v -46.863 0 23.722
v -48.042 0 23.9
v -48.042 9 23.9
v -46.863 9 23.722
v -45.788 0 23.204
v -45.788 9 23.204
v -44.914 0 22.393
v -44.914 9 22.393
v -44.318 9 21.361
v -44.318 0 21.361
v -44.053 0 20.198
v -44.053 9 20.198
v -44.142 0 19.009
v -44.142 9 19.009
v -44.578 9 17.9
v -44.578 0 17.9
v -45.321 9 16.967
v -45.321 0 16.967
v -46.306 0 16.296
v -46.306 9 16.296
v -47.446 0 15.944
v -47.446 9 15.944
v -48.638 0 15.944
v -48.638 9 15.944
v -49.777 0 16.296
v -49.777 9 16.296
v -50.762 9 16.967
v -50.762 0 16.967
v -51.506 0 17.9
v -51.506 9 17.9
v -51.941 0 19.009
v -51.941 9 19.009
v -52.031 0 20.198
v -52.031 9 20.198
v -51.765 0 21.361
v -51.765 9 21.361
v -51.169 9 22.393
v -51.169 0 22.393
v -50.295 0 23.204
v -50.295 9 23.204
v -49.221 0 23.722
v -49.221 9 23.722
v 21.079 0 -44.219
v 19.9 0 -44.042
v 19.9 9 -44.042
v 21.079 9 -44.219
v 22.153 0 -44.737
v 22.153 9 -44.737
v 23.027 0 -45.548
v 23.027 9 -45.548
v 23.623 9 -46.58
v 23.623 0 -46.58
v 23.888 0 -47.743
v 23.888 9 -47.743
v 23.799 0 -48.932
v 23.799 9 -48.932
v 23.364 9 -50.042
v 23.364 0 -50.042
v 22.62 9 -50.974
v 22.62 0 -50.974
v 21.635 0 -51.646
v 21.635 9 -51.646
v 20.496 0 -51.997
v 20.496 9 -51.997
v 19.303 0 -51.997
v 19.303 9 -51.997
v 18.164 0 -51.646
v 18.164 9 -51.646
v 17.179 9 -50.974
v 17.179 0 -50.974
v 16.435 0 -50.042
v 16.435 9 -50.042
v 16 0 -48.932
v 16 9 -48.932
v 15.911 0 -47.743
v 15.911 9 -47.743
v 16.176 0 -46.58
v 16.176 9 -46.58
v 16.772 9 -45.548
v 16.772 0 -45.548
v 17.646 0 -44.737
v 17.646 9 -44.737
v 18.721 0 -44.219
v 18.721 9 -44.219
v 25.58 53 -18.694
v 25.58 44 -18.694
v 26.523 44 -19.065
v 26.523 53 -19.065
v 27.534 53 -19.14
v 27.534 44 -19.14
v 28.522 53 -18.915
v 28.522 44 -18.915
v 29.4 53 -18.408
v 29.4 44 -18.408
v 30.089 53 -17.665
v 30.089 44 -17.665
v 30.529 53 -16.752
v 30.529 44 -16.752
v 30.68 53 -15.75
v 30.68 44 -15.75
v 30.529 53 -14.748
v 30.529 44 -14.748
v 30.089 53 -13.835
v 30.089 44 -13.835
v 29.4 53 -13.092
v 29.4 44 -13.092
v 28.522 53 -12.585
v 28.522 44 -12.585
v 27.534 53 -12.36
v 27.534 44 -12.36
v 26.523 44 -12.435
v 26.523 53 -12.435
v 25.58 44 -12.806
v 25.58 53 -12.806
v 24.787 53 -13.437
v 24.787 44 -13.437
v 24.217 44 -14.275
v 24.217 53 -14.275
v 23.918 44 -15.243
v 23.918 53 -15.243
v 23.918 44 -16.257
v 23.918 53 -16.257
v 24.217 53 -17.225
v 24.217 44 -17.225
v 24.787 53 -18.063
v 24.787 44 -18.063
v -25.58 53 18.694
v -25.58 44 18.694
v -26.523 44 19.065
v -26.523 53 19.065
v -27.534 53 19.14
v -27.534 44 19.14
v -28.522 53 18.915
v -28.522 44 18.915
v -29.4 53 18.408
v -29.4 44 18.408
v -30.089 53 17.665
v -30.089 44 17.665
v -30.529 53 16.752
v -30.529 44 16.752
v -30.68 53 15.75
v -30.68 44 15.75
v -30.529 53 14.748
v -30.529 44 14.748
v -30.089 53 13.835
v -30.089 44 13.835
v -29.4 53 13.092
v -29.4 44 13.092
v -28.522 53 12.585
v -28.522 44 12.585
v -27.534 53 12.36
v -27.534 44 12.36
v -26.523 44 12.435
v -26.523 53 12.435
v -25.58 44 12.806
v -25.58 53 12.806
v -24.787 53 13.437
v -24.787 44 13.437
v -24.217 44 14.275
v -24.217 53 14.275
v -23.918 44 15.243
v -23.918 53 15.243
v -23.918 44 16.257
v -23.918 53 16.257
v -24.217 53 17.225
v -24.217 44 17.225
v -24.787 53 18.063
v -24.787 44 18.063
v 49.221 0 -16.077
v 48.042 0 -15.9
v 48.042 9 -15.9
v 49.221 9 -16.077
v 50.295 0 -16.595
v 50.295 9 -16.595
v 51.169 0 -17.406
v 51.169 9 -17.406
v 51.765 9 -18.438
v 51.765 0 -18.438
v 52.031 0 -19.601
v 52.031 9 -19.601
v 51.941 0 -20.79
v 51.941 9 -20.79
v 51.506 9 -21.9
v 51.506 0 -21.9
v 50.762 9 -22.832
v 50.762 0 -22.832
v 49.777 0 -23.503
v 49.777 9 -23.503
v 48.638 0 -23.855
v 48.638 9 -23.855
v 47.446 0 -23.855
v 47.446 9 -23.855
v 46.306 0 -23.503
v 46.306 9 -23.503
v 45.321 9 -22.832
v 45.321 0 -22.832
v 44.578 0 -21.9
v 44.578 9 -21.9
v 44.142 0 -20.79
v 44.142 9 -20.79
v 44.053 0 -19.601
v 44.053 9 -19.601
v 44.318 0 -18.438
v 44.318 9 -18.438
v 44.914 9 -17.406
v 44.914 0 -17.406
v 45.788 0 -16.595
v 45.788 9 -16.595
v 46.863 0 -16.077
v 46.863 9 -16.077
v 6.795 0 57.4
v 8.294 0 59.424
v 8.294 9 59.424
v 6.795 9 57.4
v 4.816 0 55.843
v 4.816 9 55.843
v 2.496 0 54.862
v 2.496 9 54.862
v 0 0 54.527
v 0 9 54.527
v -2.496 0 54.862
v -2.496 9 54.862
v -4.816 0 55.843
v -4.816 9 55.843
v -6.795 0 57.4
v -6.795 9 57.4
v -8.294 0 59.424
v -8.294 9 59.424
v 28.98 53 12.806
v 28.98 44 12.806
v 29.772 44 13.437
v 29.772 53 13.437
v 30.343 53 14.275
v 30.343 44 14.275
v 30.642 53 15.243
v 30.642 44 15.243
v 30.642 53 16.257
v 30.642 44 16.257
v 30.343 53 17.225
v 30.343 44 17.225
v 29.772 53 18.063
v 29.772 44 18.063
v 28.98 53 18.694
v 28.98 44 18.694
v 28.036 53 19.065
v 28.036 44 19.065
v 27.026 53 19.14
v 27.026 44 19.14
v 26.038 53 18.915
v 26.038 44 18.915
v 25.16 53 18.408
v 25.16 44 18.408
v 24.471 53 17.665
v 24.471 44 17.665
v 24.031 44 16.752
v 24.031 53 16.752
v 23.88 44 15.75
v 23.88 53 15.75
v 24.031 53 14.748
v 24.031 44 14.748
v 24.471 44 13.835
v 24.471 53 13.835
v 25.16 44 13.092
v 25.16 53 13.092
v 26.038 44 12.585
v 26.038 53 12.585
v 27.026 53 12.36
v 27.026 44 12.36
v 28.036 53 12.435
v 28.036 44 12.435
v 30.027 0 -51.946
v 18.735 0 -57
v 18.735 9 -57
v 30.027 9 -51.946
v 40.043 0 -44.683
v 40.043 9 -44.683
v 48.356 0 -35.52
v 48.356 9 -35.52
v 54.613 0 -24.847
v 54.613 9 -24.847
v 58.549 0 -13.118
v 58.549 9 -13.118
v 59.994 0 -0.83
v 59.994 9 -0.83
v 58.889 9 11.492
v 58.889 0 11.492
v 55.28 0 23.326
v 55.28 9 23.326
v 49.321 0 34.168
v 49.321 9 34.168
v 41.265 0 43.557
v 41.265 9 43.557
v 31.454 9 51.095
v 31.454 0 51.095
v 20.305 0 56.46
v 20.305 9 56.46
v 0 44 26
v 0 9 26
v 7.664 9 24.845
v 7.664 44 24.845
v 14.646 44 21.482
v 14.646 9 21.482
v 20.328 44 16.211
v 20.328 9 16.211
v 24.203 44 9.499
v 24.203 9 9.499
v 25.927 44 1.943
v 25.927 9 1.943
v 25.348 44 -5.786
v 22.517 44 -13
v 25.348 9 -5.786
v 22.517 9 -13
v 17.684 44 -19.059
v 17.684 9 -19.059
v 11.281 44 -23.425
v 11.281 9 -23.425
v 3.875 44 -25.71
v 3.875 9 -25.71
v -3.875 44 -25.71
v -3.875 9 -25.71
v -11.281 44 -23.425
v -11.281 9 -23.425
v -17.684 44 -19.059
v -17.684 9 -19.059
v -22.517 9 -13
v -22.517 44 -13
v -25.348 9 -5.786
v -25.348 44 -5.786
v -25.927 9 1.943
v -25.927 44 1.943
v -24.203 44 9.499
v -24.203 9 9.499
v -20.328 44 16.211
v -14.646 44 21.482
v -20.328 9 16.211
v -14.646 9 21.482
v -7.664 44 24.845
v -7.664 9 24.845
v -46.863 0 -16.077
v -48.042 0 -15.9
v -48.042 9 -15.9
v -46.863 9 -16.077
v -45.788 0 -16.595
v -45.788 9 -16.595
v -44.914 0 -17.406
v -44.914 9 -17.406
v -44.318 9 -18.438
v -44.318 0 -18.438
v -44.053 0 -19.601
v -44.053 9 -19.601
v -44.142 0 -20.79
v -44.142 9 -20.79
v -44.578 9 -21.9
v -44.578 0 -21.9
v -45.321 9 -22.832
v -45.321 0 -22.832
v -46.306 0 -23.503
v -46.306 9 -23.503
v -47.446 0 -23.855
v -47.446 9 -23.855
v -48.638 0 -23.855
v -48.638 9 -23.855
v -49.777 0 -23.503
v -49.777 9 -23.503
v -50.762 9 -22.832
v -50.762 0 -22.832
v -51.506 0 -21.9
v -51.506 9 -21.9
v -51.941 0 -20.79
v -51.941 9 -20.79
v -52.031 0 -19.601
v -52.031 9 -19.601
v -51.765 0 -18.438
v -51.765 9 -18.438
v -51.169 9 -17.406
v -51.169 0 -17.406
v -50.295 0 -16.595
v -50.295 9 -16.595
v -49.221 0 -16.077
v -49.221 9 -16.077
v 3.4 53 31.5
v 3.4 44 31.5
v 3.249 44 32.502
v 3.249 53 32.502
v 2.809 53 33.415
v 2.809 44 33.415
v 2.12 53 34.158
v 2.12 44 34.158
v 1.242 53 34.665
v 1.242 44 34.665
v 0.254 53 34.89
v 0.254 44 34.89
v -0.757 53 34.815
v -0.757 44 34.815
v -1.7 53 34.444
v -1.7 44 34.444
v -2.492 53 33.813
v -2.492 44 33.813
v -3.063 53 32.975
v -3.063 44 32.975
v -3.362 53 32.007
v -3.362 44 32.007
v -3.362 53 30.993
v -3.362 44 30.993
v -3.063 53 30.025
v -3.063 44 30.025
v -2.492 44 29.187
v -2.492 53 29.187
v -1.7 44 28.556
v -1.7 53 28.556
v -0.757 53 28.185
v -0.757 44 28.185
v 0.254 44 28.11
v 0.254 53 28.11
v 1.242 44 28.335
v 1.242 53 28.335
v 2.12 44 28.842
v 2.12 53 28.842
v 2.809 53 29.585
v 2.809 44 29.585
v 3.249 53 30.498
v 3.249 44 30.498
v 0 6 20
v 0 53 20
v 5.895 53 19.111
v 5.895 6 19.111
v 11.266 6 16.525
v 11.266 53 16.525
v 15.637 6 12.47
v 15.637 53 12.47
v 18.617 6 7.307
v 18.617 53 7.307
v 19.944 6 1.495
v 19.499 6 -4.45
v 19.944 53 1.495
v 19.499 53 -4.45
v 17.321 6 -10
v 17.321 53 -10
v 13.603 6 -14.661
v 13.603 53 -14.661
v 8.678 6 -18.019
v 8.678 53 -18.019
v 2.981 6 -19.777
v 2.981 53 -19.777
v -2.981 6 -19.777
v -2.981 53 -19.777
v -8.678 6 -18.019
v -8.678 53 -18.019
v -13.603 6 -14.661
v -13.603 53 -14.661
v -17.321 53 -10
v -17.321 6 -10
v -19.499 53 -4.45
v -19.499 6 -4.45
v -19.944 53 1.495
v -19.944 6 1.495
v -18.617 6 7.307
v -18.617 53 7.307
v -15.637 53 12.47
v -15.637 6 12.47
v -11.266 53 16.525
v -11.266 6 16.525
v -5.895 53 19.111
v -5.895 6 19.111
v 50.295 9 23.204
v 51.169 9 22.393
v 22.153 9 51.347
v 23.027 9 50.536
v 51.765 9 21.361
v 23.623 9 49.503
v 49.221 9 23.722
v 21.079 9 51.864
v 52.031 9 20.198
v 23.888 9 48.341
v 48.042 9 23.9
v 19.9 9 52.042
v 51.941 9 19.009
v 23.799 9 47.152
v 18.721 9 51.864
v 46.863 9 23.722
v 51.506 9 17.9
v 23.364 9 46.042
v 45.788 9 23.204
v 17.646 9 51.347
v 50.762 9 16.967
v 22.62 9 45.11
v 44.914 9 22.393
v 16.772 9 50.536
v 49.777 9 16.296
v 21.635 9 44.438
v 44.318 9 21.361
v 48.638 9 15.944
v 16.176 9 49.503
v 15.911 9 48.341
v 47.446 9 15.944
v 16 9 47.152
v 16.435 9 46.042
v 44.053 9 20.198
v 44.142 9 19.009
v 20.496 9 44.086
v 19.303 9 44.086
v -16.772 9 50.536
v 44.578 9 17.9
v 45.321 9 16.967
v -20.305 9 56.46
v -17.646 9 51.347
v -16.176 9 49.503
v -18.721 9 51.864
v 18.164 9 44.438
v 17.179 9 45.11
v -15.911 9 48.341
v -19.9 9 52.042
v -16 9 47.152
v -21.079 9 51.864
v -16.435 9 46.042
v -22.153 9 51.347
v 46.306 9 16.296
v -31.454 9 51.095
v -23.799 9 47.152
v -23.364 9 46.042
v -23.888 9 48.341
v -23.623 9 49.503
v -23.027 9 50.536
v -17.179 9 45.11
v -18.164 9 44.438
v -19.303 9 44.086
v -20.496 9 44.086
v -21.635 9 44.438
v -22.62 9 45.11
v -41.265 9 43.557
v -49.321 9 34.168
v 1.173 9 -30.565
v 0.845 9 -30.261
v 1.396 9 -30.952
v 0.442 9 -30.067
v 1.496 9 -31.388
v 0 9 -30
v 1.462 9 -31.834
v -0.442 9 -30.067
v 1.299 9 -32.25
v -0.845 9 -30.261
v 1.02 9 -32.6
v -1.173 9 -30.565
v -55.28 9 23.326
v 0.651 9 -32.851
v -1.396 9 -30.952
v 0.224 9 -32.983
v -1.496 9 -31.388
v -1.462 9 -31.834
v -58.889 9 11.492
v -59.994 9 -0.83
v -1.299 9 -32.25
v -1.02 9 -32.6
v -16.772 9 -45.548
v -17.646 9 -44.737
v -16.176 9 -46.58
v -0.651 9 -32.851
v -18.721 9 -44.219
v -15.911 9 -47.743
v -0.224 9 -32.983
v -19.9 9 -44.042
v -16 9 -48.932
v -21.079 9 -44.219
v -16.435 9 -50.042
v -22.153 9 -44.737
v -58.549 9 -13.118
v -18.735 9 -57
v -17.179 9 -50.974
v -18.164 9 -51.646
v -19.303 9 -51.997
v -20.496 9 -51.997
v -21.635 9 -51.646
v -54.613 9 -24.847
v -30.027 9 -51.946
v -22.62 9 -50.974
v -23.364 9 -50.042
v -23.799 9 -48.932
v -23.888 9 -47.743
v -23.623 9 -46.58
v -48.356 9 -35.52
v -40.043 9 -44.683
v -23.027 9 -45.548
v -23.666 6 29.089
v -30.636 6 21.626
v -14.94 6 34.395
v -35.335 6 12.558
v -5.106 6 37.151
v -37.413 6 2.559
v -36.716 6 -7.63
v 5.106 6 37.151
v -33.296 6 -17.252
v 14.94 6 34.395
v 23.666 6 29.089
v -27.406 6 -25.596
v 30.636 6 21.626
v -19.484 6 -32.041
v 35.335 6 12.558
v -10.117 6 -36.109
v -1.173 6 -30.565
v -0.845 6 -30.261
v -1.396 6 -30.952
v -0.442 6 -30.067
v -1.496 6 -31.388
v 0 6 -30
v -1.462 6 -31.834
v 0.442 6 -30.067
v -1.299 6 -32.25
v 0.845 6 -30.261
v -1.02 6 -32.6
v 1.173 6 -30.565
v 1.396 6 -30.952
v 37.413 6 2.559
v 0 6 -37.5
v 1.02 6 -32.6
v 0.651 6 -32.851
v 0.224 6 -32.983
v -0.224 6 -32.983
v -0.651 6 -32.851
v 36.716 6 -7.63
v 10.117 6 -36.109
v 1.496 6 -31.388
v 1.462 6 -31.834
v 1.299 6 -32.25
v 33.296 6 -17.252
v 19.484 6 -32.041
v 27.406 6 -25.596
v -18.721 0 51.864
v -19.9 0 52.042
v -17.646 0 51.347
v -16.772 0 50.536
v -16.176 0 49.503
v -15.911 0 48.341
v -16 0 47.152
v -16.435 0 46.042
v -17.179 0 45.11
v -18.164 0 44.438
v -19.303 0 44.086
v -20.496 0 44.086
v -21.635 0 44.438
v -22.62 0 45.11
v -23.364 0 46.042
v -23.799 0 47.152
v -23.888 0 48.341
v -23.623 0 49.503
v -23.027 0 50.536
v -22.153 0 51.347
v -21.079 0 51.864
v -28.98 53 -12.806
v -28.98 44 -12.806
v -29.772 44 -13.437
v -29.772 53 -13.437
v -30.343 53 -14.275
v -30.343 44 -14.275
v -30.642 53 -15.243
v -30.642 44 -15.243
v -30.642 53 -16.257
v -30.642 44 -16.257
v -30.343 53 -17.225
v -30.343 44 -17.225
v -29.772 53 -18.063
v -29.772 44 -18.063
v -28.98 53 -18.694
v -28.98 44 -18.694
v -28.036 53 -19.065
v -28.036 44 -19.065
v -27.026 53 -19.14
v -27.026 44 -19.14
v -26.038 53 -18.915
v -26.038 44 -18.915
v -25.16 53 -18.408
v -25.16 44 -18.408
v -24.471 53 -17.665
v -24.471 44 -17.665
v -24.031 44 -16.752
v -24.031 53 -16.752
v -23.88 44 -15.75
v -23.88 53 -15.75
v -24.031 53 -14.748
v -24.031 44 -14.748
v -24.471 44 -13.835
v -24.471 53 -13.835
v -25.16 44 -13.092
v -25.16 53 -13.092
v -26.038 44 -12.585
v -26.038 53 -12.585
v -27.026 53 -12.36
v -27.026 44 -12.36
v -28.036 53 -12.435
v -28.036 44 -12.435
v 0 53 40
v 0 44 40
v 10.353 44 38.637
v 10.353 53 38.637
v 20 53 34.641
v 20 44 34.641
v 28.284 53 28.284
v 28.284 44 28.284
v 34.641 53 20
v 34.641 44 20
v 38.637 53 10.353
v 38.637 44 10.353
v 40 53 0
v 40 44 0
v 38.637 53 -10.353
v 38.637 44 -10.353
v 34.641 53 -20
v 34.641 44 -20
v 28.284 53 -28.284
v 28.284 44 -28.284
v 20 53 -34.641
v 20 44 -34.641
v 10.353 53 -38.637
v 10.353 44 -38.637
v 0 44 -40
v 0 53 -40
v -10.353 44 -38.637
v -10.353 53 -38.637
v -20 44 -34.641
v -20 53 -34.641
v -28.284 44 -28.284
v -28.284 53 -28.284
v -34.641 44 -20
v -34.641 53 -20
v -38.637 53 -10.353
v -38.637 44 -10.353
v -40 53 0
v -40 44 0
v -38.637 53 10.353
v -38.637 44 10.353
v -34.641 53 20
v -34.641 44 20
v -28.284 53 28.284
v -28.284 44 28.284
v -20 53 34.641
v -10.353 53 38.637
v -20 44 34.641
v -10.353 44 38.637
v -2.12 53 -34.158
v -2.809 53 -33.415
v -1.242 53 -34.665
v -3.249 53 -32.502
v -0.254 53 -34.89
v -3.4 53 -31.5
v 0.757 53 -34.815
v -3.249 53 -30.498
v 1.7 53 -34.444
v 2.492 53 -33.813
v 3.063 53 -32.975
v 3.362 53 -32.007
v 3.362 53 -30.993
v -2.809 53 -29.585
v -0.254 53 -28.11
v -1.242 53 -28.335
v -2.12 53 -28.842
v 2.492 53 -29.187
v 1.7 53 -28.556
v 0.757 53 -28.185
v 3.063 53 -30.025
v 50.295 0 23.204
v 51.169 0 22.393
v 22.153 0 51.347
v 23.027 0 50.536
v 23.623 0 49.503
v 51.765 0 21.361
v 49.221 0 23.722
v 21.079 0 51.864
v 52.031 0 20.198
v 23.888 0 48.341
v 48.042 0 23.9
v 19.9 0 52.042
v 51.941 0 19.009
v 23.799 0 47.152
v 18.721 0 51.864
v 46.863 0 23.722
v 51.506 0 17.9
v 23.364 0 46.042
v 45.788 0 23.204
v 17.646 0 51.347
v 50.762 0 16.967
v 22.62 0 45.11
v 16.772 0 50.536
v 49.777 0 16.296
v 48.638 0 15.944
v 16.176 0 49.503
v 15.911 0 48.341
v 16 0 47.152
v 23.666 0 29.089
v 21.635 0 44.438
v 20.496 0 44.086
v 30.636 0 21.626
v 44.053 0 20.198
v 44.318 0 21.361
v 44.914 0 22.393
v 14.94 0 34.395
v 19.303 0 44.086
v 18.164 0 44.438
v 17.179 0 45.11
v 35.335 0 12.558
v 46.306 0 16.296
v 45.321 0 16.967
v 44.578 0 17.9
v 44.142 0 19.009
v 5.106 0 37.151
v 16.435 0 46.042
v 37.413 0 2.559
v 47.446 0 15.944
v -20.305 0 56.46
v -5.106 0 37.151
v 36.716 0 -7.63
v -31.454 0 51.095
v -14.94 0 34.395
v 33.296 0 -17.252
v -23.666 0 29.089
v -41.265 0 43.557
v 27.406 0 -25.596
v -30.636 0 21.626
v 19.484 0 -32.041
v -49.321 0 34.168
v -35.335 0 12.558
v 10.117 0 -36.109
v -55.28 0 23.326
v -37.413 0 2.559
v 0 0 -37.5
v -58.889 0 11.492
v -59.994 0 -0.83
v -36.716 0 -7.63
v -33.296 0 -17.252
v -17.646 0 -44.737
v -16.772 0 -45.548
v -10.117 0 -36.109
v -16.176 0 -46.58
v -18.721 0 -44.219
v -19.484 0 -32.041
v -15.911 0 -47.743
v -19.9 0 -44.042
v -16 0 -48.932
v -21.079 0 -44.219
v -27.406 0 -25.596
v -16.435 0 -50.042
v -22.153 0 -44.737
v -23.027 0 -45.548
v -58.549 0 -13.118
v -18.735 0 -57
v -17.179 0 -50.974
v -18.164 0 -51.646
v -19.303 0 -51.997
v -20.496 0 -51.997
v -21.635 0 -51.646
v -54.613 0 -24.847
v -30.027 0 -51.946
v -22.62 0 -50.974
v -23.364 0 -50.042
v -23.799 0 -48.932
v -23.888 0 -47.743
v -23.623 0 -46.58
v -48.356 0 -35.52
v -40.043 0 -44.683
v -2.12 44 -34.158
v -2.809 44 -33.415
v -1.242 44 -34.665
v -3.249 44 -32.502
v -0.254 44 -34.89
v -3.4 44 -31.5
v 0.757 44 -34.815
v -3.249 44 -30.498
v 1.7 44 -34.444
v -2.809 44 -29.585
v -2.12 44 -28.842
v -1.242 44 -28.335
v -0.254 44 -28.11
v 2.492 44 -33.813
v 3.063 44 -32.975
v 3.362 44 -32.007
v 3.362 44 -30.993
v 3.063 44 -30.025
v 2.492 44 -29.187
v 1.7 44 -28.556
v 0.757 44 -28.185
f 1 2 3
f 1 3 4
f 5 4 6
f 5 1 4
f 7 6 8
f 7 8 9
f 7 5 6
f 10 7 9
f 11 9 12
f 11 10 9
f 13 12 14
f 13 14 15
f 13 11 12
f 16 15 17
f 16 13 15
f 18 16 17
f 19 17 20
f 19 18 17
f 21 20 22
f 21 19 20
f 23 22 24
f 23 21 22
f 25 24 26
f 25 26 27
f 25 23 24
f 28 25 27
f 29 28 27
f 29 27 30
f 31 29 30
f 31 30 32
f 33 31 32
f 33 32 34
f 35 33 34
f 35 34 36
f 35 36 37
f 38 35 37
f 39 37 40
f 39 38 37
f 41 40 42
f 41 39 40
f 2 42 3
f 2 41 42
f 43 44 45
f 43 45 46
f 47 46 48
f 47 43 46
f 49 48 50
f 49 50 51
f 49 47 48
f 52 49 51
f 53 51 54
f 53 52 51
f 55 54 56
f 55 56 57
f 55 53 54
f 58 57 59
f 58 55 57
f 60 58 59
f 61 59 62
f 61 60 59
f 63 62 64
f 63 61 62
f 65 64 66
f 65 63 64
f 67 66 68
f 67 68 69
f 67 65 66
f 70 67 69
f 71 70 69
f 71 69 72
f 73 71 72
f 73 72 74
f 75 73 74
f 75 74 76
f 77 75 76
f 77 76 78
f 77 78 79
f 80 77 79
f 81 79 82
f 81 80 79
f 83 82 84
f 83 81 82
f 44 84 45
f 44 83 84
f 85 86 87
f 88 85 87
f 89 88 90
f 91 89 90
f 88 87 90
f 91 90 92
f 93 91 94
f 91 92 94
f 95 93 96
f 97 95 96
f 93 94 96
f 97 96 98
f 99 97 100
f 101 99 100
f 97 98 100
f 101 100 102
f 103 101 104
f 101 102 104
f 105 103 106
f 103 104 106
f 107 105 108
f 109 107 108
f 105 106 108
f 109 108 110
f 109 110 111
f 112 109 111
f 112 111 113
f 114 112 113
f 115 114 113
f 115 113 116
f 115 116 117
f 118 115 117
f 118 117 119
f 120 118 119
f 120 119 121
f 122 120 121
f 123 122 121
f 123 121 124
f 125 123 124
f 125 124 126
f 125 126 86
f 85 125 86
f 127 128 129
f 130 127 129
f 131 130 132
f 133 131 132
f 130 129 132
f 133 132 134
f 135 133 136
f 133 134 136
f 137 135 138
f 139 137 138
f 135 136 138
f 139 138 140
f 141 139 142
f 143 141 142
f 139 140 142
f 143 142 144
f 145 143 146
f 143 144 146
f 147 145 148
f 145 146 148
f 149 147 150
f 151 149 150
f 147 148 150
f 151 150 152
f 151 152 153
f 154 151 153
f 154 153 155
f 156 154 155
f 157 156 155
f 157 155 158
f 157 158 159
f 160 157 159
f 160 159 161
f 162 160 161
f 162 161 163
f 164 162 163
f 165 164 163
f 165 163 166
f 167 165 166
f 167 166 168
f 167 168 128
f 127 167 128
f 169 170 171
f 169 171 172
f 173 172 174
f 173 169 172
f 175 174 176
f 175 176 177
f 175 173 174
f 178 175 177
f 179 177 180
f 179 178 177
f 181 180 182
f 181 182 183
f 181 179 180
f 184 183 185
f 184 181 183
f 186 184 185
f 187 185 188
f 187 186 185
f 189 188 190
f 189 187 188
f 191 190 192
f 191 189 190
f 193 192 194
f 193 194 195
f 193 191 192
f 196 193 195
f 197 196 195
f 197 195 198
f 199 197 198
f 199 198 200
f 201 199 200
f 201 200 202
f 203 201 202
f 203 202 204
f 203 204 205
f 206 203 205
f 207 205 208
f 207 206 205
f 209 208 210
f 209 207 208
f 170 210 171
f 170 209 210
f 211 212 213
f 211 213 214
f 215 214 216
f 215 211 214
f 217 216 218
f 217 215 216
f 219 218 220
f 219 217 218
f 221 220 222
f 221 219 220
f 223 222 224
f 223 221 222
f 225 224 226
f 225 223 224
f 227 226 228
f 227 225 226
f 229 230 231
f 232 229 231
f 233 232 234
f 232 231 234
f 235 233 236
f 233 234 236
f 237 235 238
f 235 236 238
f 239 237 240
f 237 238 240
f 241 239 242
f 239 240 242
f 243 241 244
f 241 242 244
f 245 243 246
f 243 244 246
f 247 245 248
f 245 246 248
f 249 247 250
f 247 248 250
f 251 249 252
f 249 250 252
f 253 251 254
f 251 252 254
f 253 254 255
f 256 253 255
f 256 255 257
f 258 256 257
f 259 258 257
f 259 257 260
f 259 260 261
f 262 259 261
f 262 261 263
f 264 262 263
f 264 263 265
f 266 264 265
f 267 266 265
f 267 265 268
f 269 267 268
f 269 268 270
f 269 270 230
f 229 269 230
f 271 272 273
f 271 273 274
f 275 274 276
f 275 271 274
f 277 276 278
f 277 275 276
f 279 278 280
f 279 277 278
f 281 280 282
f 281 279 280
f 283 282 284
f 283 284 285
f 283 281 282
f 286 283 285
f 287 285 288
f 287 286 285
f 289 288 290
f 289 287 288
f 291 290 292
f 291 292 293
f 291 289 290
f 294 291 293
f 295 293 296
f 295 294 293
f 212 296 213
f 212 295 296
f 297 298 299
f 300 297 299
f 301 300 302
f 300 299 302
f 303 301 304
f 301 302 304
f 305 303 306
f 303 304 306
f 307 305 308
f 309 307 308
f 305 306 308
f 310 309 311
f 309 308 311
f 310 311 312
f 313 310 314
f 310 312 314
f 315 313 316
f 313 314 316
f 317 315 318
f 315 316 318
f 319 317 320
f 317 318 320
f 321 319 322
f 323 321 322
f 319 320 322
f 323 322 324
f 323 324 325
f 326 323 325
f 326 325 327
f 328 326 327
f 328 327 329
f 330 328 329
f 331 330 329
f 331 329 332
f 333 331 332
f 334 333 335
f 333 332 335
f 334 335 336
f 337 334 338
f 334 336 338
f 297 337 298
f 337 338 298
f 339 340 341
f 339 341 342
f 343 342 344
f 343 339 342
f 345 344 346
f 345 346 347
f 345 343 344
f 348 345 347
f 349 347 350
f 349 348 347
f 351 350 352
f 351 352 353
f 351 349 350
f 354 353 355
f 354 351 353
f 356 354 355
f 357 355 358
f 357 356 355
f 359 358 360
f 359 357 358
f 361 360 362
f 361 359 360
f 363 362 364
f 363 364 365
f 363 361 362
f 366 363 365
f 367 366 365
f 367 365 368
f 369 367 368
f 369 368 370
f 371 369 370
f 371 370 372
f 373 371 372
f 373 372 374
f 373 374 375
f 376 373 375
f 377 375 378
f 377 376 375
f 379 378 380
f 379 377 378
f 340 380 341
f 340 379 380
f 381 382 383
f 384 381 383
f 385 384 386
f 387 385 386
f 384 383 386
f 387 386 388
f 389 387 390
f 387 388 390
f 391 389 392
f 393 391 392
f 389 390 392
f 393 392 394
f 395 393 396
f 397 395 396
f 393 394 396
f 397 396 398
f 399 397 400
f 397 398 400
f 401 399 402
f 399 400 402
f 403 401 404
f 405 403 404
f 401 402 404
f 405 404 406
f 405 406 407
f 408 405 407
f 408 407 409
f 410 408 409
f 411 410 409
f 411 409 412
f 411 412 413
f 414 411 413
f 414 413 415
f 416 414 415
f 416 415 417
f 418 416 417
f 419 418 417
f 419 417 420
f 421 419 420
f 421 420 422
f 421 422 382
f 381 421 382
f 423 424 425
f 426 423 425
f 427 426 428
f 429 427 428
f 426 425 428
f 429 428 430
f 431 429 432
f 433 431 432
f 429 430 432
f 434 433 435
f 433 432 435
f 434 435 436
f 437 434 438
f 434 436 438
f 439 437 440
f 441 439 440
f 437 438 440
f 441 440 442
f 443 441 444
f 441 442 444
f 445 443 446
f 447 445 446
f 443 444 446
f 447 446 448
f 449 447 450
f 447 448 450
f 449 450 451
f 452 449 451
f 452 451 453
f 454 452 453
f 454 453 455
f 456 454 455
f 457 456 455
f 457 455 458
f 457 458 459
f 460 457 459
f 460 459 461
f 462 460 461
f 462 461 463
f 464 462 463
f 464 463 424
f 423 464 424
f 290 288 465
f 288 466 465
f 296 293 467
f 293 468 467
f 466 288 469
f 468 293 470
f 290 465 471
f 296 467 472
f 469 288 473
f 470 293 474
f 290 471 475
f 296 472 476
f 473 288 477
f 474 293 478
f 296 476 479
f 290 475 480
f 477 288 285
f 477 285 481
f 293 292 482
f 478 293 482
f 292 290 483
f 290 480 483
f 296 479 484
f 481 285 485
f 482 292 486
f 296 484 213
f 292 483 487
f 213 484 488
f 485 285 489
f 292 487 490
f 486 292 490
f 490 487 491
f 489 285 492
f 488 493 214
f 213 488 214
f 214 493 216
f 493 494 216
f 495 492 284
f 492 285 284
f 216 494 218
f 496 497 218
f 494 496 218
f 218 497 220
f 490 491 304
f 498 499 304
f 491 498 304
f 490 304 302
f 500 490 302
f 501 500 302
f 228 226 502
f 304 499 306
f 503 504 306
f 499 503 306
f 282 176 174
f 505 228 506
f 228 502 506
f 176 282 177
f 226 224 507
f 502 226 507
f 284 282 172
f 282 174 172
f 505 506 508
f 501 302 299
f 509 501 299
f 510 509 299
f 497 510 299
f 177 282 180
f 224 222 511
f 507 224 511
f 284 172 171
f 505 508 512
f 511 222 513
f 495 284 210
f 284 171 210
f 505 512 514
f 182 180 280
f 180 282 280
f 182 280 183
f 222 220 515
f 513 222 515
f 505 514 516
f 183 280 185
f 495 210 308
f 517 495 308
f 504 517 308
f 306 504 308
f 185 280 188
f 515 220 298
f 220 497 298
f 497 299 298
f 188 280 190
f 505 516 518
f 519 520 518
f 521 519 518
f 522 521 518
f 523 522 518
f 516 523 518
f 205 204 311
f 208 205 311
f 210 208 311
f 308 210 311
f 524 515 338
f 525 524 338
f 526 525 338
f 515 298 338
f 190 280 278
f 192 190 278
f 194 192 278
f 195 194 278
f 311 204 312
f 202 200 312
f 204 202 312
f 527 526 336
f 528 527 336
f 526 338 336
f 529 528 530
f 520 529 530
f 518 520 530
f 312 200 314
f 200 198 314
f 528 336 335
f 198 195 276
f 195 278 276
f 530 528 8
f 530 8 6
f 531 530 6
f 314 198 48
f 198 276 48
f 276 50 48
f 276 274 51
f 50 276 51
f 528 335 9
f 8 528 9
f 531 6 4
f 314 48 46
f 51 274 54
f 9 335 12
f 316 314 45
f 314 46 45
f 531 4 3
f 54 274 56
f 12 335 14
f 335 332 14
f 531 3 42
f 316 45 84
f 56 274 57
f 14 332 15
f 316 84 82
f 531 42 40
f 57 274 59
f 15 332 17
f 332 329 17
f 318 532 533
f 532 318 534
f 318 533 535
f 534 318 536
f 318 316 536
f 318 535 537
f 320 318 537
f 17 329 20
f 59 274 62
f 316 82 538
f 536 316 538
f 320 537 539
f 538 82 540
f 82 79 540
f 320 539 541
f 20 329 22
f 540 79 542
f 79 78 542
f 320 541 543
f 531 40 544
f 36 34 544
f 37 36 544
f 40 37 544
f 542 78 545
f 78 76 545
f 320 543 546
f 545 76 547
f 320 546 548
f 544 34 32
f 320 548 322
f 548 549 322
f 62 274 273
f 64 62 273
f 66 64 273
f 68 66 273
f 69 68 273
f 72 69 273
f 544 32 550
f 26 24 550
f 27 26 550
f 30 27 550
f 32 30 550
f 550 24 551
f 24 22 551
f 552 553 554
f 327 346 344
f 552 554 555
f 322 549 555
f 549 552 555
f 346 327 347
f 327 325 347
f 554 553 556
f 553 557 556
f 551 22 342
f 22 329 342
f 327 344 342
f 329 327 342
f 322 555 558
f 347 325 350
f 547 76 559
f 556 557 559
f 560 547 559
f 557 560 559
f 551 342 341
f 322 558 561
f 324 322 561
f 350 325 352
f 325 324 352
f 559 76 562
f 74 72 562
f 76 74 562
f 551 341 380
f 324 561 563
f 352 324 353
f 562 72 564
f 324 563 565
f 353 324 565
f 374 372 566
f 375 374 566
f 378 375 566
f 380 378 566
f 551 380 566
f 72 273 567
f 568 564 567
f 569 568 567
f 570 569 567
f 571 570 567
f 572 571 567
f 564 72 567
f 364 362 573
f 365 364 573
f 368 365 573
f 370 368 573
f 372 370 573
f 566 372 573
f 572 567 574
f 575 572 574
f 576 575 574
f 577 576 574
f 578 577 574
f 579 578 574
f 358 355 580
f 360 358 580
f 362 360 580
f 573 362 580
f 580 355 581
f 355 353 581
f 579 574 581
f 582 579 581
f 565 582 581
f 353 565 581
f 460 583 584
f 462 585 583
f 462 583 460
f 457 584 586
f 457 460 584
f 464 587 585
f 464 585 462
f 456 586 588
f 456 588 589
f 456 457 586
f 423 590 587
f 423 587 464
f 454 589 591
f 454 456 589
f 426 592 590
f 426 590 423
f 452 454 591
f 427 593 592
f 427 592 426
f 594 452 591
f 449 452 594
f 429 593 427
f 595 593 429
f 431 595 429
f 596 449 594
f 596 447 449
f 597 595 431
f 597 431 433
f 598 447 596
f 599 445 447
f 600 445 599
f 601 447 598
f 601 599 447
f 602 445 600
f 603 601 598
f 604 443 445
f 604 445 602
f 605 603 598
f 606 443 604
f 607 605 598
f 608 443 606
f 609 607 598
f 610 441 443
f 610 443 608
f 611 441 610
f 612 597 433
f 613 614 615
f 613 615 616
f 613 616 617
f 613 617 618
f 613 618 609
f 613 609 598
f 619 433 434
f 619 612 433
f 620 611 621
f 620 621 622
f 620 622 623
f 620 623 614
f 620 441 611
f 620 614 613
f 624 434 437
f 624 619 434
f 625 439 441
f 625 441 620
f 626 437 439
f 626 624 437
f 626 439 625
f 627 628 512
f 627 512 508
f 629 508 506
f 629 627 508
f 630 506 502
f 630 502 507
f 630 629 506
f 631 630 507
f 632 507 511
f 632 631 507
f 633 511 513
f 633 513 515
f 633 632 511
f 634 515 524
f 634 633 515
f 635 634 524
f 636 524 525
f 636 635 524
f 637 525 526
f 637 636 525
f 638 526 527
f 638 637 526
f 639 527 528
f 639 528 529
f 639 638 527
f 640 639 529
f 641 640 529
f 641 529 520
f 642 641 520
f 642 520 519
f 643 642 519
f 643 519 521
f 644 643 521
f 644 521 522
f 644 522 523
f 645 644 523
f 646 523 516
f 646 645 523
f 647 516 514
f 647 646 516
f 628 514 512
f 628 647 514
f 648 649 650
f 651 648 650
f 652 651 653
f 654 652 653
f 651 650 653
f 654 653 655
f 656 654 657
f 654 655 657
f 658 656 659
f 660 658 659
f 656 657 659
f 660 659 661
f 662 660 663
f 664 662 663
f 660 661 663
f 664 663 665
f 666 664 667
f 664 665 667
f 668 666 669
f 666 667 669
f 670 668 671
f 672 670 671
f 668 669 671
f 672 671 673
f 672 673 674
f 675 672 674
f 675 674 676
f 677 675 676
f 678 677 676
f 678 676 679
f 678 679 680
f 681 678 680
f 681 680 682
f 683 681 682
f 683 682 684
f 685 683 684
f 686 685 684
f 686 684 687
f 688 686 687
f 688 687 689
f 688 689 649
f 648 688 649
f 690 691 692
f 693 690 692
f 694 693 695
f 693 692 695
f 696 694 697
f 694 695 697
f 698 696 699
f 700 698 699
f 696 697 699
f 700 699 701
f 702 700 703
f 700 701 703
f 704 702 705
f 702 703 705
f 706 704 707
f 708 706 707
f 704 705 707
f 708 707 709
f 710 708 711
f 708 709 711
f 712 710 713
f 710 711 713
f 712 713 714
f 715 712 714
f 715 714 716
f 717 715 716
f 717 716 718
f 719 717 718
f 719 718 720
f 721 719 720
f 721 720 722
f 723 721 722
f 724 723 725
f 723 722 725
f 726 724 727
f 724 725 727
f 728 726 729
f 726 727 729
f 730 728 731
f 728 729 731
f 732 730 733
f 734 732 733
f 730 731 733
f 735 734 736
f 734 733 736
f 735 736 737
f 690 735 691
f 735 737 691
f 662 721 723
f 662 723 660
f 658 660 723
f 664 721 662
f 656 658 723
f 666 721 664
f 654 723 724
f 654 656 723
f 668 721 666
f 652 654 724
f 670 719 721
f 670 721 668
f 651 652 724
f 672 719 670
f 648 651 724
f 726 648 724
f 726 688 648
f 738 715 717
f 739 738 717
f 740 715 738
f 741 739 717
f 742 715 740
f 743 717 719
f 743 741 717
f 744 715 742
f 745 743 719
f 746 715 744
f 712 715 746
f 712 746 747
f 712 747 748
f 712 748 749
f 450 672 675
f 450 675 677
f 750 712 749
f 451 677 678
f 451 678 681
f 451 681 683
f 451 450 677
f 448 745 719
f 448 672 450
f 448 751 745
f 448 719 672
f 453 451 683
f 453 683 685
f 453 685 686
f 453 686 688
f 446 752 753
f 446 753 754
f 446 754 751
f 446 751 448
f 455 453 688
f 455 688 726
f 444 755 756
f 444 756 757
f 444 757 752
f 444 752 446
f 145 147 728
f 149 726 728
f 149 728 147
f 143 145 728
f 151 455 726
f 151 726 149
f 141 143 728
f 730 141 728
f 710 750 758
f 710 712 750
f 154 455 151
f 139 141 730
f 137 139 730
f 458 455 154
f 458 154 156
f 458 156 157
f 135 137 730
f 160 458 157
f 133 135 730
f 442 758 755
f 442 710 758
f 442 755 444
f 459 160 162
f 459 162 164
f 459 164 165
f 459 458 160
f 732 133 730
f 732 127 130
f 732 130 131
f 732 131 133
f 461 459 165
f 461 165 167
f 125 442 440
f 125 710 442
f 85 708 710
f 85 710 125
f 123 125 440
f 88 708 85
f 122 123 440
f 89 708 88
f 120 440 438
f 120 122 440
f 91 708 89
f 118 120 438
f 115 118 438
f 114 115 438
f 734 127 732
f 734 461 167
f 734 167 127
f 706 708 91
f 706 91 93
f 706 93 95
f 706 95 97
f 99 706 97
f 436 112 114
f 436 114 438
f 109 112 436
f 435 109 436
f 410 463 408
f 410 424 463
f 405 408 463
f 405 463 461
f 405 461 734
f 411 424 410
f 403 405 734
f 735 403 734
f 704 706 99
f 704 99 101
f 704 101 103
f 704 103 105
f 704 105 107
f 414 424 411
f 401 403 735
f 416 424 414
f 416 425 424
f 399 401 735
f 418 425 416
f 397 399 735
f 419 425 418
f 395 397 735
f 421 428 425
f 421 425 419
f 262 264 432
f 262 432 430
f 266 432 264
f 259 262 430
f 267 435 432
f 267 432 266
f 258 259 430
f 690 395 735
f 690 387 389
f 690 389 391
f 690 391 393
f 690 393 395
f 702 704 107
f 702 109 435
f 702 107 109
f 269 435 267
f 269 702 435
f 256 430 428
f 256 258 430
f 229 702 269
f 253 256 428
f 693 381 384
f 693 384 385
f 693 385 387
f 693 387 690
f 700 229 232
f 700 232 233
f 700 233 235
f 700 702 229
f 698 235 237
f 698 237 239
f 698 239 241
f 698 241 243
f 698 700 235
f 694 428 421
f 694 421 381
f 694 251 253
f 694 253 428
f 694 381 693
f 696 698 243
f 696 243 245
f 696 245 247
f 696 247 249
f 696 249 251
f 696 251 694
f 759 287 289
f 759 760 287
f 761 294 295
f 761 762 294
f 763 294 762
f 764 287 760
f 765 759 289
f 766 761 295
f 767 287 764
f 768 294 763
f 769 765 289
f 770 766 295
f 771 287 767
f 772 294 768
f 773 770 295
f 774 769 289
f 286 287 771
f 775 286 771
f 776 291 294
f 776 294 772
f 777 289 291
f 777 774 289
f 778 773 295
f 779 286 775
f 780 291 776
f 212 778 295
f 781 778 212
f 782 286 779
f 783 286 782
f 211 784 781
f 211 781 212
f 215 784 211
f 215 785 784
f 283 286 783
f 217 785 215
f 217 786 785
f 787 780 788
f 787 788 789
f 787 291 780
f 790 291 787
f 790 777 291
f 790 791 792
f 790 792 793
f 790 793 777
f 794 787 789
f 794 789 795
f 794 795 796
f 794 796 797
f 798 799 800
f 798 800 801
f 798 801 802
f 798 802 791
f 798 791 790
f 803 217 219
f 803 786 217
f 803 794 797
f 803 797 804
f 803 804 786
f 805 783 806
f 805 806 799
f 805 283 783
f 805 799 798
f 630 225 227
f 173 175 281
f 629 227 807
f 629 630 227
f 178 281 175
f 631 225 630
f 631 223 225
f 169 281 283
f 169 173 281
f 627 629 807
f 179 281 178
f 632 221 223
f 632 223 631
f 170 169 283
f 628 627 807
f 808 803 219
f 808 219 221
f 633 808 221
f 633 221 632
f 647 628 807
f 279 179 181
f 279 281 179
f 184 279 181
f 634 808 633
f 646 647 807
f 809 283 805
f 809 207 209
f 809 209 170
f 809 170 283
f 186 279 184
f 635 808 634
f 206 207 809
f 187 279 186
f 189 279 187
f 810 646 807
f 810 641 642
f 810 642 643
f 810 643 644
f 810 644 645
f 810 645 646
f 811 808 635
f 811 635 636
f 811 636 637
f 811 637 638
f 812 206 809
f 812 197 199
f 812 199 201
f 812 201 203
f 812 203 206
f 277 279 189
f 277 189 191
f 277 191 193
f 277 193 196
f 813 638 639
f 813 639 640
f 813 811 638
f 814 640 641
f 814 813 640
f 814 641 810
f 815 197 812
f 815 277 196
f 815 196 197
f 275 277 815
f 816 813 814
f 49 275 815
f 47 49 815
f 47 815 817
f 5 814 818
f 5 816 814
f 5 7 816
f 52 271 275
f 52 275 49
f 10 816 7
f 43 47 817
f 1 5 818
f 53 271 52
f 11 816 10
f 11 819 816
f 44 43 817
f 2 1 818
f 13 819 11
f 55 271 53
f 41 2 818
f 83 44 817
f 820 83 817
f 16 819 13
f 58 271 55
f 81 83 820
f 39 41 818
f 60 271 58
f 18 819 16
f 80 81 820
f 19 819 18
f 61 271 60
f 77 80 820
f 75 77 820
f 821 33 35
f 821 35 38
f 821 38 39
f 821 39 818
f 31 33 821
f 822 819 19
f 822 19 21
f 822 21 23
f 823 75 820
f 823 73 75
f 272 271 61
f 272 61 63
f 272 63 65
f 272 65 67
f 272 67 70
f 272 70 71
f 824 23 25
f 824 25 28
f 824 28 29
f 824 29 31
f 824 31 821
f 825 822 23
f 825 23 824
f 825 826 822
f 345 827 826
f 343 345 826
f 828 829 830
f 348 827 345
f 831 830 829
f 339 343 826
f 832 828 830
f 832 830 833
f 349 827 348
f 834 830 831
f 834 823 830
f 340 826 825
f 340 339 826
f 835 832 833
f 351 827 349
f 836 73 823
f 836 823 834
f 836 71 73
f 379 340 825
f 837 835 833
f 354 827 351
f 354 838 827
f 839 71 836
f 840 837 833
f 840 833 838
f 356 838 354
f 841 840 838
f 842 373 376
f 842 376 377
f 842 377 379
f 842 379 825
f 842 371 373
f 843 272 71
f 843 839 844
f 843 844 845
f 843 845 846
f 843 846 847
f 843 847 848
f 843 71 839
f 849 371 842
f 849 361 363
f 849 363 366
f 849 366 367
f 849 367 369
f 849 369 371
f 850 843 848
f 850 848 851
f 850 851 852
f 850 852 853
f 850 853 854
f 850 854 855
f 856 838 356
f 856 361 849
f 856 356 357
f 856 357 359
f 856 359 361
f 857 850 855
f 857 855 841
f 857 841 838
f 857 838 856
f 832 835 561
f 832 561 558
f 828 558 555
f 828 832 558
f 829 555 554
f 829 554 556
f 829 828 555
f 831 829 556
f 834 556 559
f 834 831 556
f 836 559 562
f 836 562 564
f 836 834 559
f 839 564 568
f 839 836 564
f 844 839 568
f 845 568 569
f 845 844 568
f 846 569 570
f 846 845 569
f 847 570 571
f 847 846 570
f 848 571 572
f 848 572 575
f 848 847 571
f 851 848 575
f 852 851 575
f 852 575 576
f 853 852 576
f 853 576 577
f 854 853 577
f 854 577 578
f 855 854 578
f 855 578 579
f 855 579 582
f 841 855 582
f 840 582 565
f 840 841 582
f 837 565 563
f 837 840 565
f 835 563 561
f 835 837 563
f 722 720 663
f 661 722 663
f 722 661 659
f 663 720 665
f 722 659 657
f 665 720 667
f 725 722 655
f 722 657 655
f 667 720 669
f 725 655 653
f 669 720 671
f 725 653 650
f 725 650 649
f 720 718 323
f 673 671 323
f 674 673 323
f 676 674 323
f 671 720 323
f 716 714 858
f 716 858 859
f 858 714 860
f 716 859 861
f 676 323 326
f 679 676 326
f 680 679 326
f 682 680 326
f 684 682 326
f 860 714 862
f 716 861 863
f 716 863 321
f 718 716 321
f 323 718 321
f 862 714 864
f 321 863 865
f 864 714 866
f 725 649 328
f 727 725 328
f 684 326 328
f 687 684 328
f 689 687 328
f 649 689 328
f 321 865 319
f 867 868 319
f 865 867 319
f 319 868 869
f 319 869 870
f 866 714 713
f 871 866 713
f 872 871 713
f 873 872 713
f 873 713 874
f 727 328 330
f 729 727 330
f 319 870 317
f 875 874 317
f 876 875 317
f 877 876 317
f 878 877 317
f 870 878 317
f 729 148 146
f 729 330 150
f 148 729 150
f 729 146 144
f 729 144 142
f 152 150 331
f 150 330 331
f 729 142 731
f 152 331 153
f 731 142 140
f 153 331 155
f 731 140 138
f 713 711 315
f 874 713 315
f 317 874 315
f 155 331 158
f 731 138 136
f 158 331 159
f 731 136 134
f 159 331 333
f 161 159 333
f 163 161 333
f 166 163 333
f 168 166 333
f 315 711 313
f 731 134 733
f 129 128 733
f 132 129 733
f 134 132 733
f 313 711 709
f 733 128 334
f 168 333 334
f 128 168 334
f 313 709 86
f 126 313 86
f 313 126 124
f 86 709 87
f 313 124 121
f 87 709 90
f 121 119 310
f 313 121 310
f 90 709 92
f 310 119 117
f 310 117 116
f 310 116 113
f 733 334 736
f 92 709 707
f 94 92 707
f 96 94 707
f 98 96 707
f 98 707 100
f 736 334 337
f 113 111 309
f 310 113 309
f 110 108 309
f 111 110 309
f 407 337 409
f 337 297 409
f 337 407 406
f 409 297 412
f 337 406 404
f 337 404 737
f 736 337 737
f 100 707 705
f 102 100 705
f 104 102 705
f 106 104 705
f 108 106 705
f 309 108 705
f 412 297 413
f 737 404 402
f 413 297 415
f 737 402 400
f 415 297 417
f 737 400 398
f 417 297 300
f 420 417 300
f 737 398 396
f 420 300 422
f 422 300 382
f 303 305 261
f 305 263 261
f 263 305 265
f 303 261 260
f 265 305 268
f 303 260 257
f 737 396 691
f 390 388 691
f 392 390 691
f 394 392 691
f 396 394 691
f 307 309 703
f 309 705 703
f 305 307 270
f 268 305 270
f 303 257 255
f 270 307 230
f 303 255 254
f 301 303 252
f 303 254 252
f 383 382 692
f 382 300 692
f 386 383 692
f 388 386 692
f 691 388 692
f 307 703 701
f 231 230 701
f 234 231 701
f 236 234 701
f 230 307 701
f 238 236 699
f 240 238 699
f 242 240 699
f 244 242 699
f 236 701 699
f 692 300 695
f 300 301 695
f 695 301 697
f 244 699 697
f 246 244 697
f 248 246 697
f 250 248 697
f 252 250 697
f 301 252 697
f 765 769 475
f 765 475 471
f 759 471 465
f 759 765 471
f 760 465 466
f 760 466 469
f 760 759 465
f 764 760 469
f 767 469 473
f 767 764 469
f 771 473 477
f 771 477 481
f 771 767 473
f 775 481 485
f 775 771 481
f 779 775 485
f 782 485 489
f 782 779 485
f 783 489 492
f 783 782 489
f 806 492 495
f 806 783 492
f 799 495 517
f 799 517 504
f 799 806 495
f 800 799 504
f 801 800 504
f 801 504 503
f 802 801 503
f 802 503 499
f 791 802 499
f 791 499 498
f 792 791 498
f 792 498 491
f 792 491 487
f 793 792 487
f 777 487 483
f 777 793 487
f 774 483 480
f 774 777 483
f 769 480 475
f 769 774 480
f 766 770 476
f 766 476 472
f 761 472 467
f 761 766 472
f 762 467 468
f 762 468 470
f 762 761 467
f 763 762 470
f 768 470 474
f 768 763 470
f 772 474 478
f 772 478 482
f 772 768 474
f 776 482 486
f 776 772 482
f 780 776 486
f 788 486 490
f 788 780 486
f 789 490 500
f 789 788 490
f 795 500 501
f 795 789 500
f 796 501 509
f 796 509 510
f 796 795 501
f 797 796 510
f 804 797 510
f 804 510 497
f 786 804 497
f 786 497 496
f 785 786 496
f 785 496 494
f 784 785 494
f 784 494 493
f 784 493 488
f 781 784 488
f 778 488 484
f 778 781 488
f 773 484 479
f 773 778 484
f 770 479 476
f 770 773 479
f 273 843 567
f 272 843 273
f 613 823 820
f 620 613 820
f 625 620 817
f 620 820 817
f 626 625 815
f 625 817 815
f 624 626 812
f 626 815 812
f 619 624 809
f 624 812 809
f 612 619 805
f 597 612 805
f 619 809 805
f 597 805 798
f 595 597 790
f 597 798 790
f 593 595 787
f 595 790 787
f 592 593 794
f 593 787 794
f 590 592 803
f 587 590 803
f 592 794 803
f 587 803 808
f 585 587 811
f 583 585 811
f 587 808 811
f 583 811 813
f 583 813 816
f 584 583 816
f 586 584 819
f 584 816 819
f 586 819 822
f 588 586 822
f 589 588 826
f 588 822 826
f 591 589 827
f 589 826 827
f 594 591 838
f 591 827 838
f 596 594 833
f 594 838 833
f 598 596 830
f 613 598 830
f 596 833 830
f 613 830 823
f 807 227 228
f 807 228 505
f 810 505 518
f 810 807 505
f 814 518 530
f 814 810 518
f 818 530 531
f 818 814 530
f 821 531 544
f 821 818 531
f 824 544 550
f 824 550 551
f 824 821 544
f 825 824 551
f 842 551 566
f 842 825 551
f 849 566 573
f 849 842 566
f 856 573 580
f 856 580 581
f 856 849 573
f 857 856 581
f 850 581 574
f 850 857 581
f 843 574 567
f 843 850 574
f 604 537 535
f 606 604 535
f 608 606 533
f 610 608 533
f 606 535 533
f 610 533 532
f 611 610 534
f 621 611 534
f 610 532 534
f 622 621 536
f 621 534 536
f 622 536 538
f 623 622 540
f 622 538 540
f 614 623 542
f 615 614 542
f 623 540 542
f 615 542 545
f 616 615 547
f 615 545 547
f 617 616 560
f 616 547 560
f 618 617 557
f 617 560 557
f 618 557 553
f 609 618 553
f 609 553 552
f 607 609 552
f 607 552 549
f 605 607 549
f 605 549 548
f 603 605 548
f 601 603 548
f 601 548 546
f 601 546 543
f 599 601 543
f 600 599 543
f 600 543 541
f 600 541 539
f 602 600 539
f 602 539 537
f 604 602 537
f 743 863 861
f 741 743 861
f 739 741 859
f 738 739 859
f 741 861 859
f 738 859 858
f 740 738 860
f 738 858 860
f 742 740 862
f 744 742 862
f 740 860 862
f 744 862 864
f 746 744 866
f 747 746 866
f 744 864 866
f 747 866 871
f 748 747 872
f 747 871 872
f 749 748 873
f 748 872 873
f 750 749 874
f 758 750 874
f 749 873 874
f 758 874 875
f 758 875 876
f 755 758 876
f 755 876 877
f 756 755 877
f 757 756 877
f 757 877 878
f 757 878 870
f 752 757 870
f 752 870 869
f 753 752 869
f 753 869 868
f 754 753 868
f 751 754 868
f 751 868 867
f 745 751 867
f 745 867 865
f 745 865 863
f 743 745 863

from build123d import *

# Parameters (mm, degrees)
SKETCH_1_R               = 4
EXTRUDE_1_DEPTH          = 9
SKETCH_2_R               = 26
EXTRUDE_2_DEPTH          = 35
SKETCH_3_R               = 40
EXTRUDE_3_DEPTH          = 9
HOLE_WIZARD_M8_1_D       = 6.8
HOLE_WIZARD_M8_1_DEPTH   = 9
PATTERN_CIRCULAR_1_COUNT = 6
SKETCH_6_R               = 20
CUT_EXTRUDE_1_DEPTH      = 100.700603114
SKETCH_7_R               = 37.5
CUT_EXTRUDE_2_DEPTH      = 6
SKETCH_8_R               = 1.5
CUT_EXTRUDE_3_DEPTH      = 100.700603114


with BuildPart() as part:
    # 草图1 → 凸台-拉伸1 (new body)
    with BuildSketch(Plane(origin=(0, 0, 0), x_dir=(1, 0, 0), z_dir=(0, 1, 0))):
        with BuildLine():
            Line((-18.734993995, 57), (18.734993995, 57))
            ThreePointArc((18.734993995, 57), (59.760164517, -5.359359749), (8.293957962, -59.423987255))
            ThreePointArc((8.293957962, -59.423987255), (0, -54.527427418), (-8.293957962, -59.423987255))
            ThreePointArc((-8.293957962, -59.423987255), (-59.760164517, -5.359359749), (-18.734993995, 57))
        make_face()
        with Locations(Location((-48.041735691, 19.899538483, 0), (0, 0, 270))):
            Circle(SKETCH_1_R, mode=Mode.SUBTRACT)
        with Locations(Location((-19.899538483, 48.041735691, 0), (0, 0, 270))):
            Circle(SKETCH_1_R, mode=Mode.SUBTRACT)
        with Locations(Location((19.899538483, 48.041735691, 0), (0, 0, 270))):
            Circle(SKETCH_1_R, mode=Mode.SUBTRACT)
        with Locations(Location((48.041735691, 19.899538483, 0), (0, 0, 270))):
            Circle(SKETCH_1_R, mode=Mode.SUBTRACT)
        with Locations(Location((48.041735691, -19.899538483, 0), (0, 0, 270))):
            Circle(SKETCH_1_R, mode=Mode.SUBTRACT)
        with Locations(Location((19.899538483, -48.041735691, 0), (0, 0, 270))):
            Circle(SKETCH_1_R, mode=Mode.SUBTRACT)
        with Locations(Location((-19.899538483, -48.041735691, 0), (0, 0, 270))):
            Circle(SKETCH_1_R, mode=Mode.SUBTRACT)
        with Locations(Location((-48.041735691, -19.899538483, 0), (0, 0, 270))):
            Circle(SKETCH_1_R, mode=Mode.SUBTRACT)
    extrude(amount=EXTRUDE_1_DEPTH)

    # 草图2 → 凸台-拉伸2 (add)
    with BuildSketch(Plane(origin=(0, 9, 0), x_dir=(1, 0, 0), z_dir=(0, 1, 0))):
        with Locations(Location((0, 0, 0), (0, 0, 270))):
            Circle(SKETCH_2_R)
    extrude(amount=EXTRUDE_2_DEPTH)

    # 草图3 → 凸台-拉伸3 (add)
    with BuildSketch(Plane(origin=(0, 44, 0), x_dir=(1, 0, 0), z_dir=(0, 1, 0))):
        with Locations(Location((0, 0, 0), (0, 0, 270))):
            Circle(SKETCH_3_R)
    extrude(amount=EXTRUDE_3_DEPTH)

    # M8 螺纹孔1
    with Locations(Plane(origin=(0, 53, 0), x_dir=(1, 0, 0), z_dir=(0, 1, 0))):
        with Locations((0, 31.5)):
            hole_wizard_m8_1 = Hole(HOLE_WIZARD_M8_1_D / 2, depth=HOLE_WIZARD_M8_1_DEPTH)

    # 阵列(圆周)1: M8 螺纹孔1 ×6 about axis
    pattern_circular_1_axis = Axis((0, 0, 0), (0, 1, 0))
    for i in range(1, PATTERN_CIRCULAR_1_COUNT):
        add(hole_wizard_m8_1.rotate(pattern_circular_1_axis, i * 360 / PATTERN_CIRCULAR_1_COUNT), mode=Mode.SUBTRACT)

    # 草图6 → 切除-拉伸1 (cut, through all)
    with BuildSketch(Plane(origin=(0, 53, 0), x_dir=(1, 0, 0), z_dir=(0, 1, 0))):
        with Locations(Location((0, 0, 0), (0, 0, 270))):
            Circle(SKETCH_6_R)
    extrude(amount=-CUT_EXTRUDE_1_DEPTH, mode=Mode.SUBTRACT)

    # 草图7 → 切除-拉伸2 (cut)
    with BuildSketch(Plane.XZ):
        with Locations(Location((0, 0, 0), (0, 0, 270))):
            Circle(SKETCH_7_R)
    extrude(amount=-CUT_EXTRUDE_2_DEPTH, mode=Mode.SUBTRACT)

    # 草图8 → 切除-拉伸3 (cut, through all)
    with BuildSketch(Plane(origin=(0, 53, 0), x_dir=(1, 0, 0), z_dir=(0, 1, 0))):
        with Locations(Location((0, 31.5, 0), (0, 0, 270))):
            Circle(SKETCH_8_R)
    extrude(amount=-CUT_EXTRUDE_3_DEPTH, mode=Mode.SUBTRACT)


solid = part.part
